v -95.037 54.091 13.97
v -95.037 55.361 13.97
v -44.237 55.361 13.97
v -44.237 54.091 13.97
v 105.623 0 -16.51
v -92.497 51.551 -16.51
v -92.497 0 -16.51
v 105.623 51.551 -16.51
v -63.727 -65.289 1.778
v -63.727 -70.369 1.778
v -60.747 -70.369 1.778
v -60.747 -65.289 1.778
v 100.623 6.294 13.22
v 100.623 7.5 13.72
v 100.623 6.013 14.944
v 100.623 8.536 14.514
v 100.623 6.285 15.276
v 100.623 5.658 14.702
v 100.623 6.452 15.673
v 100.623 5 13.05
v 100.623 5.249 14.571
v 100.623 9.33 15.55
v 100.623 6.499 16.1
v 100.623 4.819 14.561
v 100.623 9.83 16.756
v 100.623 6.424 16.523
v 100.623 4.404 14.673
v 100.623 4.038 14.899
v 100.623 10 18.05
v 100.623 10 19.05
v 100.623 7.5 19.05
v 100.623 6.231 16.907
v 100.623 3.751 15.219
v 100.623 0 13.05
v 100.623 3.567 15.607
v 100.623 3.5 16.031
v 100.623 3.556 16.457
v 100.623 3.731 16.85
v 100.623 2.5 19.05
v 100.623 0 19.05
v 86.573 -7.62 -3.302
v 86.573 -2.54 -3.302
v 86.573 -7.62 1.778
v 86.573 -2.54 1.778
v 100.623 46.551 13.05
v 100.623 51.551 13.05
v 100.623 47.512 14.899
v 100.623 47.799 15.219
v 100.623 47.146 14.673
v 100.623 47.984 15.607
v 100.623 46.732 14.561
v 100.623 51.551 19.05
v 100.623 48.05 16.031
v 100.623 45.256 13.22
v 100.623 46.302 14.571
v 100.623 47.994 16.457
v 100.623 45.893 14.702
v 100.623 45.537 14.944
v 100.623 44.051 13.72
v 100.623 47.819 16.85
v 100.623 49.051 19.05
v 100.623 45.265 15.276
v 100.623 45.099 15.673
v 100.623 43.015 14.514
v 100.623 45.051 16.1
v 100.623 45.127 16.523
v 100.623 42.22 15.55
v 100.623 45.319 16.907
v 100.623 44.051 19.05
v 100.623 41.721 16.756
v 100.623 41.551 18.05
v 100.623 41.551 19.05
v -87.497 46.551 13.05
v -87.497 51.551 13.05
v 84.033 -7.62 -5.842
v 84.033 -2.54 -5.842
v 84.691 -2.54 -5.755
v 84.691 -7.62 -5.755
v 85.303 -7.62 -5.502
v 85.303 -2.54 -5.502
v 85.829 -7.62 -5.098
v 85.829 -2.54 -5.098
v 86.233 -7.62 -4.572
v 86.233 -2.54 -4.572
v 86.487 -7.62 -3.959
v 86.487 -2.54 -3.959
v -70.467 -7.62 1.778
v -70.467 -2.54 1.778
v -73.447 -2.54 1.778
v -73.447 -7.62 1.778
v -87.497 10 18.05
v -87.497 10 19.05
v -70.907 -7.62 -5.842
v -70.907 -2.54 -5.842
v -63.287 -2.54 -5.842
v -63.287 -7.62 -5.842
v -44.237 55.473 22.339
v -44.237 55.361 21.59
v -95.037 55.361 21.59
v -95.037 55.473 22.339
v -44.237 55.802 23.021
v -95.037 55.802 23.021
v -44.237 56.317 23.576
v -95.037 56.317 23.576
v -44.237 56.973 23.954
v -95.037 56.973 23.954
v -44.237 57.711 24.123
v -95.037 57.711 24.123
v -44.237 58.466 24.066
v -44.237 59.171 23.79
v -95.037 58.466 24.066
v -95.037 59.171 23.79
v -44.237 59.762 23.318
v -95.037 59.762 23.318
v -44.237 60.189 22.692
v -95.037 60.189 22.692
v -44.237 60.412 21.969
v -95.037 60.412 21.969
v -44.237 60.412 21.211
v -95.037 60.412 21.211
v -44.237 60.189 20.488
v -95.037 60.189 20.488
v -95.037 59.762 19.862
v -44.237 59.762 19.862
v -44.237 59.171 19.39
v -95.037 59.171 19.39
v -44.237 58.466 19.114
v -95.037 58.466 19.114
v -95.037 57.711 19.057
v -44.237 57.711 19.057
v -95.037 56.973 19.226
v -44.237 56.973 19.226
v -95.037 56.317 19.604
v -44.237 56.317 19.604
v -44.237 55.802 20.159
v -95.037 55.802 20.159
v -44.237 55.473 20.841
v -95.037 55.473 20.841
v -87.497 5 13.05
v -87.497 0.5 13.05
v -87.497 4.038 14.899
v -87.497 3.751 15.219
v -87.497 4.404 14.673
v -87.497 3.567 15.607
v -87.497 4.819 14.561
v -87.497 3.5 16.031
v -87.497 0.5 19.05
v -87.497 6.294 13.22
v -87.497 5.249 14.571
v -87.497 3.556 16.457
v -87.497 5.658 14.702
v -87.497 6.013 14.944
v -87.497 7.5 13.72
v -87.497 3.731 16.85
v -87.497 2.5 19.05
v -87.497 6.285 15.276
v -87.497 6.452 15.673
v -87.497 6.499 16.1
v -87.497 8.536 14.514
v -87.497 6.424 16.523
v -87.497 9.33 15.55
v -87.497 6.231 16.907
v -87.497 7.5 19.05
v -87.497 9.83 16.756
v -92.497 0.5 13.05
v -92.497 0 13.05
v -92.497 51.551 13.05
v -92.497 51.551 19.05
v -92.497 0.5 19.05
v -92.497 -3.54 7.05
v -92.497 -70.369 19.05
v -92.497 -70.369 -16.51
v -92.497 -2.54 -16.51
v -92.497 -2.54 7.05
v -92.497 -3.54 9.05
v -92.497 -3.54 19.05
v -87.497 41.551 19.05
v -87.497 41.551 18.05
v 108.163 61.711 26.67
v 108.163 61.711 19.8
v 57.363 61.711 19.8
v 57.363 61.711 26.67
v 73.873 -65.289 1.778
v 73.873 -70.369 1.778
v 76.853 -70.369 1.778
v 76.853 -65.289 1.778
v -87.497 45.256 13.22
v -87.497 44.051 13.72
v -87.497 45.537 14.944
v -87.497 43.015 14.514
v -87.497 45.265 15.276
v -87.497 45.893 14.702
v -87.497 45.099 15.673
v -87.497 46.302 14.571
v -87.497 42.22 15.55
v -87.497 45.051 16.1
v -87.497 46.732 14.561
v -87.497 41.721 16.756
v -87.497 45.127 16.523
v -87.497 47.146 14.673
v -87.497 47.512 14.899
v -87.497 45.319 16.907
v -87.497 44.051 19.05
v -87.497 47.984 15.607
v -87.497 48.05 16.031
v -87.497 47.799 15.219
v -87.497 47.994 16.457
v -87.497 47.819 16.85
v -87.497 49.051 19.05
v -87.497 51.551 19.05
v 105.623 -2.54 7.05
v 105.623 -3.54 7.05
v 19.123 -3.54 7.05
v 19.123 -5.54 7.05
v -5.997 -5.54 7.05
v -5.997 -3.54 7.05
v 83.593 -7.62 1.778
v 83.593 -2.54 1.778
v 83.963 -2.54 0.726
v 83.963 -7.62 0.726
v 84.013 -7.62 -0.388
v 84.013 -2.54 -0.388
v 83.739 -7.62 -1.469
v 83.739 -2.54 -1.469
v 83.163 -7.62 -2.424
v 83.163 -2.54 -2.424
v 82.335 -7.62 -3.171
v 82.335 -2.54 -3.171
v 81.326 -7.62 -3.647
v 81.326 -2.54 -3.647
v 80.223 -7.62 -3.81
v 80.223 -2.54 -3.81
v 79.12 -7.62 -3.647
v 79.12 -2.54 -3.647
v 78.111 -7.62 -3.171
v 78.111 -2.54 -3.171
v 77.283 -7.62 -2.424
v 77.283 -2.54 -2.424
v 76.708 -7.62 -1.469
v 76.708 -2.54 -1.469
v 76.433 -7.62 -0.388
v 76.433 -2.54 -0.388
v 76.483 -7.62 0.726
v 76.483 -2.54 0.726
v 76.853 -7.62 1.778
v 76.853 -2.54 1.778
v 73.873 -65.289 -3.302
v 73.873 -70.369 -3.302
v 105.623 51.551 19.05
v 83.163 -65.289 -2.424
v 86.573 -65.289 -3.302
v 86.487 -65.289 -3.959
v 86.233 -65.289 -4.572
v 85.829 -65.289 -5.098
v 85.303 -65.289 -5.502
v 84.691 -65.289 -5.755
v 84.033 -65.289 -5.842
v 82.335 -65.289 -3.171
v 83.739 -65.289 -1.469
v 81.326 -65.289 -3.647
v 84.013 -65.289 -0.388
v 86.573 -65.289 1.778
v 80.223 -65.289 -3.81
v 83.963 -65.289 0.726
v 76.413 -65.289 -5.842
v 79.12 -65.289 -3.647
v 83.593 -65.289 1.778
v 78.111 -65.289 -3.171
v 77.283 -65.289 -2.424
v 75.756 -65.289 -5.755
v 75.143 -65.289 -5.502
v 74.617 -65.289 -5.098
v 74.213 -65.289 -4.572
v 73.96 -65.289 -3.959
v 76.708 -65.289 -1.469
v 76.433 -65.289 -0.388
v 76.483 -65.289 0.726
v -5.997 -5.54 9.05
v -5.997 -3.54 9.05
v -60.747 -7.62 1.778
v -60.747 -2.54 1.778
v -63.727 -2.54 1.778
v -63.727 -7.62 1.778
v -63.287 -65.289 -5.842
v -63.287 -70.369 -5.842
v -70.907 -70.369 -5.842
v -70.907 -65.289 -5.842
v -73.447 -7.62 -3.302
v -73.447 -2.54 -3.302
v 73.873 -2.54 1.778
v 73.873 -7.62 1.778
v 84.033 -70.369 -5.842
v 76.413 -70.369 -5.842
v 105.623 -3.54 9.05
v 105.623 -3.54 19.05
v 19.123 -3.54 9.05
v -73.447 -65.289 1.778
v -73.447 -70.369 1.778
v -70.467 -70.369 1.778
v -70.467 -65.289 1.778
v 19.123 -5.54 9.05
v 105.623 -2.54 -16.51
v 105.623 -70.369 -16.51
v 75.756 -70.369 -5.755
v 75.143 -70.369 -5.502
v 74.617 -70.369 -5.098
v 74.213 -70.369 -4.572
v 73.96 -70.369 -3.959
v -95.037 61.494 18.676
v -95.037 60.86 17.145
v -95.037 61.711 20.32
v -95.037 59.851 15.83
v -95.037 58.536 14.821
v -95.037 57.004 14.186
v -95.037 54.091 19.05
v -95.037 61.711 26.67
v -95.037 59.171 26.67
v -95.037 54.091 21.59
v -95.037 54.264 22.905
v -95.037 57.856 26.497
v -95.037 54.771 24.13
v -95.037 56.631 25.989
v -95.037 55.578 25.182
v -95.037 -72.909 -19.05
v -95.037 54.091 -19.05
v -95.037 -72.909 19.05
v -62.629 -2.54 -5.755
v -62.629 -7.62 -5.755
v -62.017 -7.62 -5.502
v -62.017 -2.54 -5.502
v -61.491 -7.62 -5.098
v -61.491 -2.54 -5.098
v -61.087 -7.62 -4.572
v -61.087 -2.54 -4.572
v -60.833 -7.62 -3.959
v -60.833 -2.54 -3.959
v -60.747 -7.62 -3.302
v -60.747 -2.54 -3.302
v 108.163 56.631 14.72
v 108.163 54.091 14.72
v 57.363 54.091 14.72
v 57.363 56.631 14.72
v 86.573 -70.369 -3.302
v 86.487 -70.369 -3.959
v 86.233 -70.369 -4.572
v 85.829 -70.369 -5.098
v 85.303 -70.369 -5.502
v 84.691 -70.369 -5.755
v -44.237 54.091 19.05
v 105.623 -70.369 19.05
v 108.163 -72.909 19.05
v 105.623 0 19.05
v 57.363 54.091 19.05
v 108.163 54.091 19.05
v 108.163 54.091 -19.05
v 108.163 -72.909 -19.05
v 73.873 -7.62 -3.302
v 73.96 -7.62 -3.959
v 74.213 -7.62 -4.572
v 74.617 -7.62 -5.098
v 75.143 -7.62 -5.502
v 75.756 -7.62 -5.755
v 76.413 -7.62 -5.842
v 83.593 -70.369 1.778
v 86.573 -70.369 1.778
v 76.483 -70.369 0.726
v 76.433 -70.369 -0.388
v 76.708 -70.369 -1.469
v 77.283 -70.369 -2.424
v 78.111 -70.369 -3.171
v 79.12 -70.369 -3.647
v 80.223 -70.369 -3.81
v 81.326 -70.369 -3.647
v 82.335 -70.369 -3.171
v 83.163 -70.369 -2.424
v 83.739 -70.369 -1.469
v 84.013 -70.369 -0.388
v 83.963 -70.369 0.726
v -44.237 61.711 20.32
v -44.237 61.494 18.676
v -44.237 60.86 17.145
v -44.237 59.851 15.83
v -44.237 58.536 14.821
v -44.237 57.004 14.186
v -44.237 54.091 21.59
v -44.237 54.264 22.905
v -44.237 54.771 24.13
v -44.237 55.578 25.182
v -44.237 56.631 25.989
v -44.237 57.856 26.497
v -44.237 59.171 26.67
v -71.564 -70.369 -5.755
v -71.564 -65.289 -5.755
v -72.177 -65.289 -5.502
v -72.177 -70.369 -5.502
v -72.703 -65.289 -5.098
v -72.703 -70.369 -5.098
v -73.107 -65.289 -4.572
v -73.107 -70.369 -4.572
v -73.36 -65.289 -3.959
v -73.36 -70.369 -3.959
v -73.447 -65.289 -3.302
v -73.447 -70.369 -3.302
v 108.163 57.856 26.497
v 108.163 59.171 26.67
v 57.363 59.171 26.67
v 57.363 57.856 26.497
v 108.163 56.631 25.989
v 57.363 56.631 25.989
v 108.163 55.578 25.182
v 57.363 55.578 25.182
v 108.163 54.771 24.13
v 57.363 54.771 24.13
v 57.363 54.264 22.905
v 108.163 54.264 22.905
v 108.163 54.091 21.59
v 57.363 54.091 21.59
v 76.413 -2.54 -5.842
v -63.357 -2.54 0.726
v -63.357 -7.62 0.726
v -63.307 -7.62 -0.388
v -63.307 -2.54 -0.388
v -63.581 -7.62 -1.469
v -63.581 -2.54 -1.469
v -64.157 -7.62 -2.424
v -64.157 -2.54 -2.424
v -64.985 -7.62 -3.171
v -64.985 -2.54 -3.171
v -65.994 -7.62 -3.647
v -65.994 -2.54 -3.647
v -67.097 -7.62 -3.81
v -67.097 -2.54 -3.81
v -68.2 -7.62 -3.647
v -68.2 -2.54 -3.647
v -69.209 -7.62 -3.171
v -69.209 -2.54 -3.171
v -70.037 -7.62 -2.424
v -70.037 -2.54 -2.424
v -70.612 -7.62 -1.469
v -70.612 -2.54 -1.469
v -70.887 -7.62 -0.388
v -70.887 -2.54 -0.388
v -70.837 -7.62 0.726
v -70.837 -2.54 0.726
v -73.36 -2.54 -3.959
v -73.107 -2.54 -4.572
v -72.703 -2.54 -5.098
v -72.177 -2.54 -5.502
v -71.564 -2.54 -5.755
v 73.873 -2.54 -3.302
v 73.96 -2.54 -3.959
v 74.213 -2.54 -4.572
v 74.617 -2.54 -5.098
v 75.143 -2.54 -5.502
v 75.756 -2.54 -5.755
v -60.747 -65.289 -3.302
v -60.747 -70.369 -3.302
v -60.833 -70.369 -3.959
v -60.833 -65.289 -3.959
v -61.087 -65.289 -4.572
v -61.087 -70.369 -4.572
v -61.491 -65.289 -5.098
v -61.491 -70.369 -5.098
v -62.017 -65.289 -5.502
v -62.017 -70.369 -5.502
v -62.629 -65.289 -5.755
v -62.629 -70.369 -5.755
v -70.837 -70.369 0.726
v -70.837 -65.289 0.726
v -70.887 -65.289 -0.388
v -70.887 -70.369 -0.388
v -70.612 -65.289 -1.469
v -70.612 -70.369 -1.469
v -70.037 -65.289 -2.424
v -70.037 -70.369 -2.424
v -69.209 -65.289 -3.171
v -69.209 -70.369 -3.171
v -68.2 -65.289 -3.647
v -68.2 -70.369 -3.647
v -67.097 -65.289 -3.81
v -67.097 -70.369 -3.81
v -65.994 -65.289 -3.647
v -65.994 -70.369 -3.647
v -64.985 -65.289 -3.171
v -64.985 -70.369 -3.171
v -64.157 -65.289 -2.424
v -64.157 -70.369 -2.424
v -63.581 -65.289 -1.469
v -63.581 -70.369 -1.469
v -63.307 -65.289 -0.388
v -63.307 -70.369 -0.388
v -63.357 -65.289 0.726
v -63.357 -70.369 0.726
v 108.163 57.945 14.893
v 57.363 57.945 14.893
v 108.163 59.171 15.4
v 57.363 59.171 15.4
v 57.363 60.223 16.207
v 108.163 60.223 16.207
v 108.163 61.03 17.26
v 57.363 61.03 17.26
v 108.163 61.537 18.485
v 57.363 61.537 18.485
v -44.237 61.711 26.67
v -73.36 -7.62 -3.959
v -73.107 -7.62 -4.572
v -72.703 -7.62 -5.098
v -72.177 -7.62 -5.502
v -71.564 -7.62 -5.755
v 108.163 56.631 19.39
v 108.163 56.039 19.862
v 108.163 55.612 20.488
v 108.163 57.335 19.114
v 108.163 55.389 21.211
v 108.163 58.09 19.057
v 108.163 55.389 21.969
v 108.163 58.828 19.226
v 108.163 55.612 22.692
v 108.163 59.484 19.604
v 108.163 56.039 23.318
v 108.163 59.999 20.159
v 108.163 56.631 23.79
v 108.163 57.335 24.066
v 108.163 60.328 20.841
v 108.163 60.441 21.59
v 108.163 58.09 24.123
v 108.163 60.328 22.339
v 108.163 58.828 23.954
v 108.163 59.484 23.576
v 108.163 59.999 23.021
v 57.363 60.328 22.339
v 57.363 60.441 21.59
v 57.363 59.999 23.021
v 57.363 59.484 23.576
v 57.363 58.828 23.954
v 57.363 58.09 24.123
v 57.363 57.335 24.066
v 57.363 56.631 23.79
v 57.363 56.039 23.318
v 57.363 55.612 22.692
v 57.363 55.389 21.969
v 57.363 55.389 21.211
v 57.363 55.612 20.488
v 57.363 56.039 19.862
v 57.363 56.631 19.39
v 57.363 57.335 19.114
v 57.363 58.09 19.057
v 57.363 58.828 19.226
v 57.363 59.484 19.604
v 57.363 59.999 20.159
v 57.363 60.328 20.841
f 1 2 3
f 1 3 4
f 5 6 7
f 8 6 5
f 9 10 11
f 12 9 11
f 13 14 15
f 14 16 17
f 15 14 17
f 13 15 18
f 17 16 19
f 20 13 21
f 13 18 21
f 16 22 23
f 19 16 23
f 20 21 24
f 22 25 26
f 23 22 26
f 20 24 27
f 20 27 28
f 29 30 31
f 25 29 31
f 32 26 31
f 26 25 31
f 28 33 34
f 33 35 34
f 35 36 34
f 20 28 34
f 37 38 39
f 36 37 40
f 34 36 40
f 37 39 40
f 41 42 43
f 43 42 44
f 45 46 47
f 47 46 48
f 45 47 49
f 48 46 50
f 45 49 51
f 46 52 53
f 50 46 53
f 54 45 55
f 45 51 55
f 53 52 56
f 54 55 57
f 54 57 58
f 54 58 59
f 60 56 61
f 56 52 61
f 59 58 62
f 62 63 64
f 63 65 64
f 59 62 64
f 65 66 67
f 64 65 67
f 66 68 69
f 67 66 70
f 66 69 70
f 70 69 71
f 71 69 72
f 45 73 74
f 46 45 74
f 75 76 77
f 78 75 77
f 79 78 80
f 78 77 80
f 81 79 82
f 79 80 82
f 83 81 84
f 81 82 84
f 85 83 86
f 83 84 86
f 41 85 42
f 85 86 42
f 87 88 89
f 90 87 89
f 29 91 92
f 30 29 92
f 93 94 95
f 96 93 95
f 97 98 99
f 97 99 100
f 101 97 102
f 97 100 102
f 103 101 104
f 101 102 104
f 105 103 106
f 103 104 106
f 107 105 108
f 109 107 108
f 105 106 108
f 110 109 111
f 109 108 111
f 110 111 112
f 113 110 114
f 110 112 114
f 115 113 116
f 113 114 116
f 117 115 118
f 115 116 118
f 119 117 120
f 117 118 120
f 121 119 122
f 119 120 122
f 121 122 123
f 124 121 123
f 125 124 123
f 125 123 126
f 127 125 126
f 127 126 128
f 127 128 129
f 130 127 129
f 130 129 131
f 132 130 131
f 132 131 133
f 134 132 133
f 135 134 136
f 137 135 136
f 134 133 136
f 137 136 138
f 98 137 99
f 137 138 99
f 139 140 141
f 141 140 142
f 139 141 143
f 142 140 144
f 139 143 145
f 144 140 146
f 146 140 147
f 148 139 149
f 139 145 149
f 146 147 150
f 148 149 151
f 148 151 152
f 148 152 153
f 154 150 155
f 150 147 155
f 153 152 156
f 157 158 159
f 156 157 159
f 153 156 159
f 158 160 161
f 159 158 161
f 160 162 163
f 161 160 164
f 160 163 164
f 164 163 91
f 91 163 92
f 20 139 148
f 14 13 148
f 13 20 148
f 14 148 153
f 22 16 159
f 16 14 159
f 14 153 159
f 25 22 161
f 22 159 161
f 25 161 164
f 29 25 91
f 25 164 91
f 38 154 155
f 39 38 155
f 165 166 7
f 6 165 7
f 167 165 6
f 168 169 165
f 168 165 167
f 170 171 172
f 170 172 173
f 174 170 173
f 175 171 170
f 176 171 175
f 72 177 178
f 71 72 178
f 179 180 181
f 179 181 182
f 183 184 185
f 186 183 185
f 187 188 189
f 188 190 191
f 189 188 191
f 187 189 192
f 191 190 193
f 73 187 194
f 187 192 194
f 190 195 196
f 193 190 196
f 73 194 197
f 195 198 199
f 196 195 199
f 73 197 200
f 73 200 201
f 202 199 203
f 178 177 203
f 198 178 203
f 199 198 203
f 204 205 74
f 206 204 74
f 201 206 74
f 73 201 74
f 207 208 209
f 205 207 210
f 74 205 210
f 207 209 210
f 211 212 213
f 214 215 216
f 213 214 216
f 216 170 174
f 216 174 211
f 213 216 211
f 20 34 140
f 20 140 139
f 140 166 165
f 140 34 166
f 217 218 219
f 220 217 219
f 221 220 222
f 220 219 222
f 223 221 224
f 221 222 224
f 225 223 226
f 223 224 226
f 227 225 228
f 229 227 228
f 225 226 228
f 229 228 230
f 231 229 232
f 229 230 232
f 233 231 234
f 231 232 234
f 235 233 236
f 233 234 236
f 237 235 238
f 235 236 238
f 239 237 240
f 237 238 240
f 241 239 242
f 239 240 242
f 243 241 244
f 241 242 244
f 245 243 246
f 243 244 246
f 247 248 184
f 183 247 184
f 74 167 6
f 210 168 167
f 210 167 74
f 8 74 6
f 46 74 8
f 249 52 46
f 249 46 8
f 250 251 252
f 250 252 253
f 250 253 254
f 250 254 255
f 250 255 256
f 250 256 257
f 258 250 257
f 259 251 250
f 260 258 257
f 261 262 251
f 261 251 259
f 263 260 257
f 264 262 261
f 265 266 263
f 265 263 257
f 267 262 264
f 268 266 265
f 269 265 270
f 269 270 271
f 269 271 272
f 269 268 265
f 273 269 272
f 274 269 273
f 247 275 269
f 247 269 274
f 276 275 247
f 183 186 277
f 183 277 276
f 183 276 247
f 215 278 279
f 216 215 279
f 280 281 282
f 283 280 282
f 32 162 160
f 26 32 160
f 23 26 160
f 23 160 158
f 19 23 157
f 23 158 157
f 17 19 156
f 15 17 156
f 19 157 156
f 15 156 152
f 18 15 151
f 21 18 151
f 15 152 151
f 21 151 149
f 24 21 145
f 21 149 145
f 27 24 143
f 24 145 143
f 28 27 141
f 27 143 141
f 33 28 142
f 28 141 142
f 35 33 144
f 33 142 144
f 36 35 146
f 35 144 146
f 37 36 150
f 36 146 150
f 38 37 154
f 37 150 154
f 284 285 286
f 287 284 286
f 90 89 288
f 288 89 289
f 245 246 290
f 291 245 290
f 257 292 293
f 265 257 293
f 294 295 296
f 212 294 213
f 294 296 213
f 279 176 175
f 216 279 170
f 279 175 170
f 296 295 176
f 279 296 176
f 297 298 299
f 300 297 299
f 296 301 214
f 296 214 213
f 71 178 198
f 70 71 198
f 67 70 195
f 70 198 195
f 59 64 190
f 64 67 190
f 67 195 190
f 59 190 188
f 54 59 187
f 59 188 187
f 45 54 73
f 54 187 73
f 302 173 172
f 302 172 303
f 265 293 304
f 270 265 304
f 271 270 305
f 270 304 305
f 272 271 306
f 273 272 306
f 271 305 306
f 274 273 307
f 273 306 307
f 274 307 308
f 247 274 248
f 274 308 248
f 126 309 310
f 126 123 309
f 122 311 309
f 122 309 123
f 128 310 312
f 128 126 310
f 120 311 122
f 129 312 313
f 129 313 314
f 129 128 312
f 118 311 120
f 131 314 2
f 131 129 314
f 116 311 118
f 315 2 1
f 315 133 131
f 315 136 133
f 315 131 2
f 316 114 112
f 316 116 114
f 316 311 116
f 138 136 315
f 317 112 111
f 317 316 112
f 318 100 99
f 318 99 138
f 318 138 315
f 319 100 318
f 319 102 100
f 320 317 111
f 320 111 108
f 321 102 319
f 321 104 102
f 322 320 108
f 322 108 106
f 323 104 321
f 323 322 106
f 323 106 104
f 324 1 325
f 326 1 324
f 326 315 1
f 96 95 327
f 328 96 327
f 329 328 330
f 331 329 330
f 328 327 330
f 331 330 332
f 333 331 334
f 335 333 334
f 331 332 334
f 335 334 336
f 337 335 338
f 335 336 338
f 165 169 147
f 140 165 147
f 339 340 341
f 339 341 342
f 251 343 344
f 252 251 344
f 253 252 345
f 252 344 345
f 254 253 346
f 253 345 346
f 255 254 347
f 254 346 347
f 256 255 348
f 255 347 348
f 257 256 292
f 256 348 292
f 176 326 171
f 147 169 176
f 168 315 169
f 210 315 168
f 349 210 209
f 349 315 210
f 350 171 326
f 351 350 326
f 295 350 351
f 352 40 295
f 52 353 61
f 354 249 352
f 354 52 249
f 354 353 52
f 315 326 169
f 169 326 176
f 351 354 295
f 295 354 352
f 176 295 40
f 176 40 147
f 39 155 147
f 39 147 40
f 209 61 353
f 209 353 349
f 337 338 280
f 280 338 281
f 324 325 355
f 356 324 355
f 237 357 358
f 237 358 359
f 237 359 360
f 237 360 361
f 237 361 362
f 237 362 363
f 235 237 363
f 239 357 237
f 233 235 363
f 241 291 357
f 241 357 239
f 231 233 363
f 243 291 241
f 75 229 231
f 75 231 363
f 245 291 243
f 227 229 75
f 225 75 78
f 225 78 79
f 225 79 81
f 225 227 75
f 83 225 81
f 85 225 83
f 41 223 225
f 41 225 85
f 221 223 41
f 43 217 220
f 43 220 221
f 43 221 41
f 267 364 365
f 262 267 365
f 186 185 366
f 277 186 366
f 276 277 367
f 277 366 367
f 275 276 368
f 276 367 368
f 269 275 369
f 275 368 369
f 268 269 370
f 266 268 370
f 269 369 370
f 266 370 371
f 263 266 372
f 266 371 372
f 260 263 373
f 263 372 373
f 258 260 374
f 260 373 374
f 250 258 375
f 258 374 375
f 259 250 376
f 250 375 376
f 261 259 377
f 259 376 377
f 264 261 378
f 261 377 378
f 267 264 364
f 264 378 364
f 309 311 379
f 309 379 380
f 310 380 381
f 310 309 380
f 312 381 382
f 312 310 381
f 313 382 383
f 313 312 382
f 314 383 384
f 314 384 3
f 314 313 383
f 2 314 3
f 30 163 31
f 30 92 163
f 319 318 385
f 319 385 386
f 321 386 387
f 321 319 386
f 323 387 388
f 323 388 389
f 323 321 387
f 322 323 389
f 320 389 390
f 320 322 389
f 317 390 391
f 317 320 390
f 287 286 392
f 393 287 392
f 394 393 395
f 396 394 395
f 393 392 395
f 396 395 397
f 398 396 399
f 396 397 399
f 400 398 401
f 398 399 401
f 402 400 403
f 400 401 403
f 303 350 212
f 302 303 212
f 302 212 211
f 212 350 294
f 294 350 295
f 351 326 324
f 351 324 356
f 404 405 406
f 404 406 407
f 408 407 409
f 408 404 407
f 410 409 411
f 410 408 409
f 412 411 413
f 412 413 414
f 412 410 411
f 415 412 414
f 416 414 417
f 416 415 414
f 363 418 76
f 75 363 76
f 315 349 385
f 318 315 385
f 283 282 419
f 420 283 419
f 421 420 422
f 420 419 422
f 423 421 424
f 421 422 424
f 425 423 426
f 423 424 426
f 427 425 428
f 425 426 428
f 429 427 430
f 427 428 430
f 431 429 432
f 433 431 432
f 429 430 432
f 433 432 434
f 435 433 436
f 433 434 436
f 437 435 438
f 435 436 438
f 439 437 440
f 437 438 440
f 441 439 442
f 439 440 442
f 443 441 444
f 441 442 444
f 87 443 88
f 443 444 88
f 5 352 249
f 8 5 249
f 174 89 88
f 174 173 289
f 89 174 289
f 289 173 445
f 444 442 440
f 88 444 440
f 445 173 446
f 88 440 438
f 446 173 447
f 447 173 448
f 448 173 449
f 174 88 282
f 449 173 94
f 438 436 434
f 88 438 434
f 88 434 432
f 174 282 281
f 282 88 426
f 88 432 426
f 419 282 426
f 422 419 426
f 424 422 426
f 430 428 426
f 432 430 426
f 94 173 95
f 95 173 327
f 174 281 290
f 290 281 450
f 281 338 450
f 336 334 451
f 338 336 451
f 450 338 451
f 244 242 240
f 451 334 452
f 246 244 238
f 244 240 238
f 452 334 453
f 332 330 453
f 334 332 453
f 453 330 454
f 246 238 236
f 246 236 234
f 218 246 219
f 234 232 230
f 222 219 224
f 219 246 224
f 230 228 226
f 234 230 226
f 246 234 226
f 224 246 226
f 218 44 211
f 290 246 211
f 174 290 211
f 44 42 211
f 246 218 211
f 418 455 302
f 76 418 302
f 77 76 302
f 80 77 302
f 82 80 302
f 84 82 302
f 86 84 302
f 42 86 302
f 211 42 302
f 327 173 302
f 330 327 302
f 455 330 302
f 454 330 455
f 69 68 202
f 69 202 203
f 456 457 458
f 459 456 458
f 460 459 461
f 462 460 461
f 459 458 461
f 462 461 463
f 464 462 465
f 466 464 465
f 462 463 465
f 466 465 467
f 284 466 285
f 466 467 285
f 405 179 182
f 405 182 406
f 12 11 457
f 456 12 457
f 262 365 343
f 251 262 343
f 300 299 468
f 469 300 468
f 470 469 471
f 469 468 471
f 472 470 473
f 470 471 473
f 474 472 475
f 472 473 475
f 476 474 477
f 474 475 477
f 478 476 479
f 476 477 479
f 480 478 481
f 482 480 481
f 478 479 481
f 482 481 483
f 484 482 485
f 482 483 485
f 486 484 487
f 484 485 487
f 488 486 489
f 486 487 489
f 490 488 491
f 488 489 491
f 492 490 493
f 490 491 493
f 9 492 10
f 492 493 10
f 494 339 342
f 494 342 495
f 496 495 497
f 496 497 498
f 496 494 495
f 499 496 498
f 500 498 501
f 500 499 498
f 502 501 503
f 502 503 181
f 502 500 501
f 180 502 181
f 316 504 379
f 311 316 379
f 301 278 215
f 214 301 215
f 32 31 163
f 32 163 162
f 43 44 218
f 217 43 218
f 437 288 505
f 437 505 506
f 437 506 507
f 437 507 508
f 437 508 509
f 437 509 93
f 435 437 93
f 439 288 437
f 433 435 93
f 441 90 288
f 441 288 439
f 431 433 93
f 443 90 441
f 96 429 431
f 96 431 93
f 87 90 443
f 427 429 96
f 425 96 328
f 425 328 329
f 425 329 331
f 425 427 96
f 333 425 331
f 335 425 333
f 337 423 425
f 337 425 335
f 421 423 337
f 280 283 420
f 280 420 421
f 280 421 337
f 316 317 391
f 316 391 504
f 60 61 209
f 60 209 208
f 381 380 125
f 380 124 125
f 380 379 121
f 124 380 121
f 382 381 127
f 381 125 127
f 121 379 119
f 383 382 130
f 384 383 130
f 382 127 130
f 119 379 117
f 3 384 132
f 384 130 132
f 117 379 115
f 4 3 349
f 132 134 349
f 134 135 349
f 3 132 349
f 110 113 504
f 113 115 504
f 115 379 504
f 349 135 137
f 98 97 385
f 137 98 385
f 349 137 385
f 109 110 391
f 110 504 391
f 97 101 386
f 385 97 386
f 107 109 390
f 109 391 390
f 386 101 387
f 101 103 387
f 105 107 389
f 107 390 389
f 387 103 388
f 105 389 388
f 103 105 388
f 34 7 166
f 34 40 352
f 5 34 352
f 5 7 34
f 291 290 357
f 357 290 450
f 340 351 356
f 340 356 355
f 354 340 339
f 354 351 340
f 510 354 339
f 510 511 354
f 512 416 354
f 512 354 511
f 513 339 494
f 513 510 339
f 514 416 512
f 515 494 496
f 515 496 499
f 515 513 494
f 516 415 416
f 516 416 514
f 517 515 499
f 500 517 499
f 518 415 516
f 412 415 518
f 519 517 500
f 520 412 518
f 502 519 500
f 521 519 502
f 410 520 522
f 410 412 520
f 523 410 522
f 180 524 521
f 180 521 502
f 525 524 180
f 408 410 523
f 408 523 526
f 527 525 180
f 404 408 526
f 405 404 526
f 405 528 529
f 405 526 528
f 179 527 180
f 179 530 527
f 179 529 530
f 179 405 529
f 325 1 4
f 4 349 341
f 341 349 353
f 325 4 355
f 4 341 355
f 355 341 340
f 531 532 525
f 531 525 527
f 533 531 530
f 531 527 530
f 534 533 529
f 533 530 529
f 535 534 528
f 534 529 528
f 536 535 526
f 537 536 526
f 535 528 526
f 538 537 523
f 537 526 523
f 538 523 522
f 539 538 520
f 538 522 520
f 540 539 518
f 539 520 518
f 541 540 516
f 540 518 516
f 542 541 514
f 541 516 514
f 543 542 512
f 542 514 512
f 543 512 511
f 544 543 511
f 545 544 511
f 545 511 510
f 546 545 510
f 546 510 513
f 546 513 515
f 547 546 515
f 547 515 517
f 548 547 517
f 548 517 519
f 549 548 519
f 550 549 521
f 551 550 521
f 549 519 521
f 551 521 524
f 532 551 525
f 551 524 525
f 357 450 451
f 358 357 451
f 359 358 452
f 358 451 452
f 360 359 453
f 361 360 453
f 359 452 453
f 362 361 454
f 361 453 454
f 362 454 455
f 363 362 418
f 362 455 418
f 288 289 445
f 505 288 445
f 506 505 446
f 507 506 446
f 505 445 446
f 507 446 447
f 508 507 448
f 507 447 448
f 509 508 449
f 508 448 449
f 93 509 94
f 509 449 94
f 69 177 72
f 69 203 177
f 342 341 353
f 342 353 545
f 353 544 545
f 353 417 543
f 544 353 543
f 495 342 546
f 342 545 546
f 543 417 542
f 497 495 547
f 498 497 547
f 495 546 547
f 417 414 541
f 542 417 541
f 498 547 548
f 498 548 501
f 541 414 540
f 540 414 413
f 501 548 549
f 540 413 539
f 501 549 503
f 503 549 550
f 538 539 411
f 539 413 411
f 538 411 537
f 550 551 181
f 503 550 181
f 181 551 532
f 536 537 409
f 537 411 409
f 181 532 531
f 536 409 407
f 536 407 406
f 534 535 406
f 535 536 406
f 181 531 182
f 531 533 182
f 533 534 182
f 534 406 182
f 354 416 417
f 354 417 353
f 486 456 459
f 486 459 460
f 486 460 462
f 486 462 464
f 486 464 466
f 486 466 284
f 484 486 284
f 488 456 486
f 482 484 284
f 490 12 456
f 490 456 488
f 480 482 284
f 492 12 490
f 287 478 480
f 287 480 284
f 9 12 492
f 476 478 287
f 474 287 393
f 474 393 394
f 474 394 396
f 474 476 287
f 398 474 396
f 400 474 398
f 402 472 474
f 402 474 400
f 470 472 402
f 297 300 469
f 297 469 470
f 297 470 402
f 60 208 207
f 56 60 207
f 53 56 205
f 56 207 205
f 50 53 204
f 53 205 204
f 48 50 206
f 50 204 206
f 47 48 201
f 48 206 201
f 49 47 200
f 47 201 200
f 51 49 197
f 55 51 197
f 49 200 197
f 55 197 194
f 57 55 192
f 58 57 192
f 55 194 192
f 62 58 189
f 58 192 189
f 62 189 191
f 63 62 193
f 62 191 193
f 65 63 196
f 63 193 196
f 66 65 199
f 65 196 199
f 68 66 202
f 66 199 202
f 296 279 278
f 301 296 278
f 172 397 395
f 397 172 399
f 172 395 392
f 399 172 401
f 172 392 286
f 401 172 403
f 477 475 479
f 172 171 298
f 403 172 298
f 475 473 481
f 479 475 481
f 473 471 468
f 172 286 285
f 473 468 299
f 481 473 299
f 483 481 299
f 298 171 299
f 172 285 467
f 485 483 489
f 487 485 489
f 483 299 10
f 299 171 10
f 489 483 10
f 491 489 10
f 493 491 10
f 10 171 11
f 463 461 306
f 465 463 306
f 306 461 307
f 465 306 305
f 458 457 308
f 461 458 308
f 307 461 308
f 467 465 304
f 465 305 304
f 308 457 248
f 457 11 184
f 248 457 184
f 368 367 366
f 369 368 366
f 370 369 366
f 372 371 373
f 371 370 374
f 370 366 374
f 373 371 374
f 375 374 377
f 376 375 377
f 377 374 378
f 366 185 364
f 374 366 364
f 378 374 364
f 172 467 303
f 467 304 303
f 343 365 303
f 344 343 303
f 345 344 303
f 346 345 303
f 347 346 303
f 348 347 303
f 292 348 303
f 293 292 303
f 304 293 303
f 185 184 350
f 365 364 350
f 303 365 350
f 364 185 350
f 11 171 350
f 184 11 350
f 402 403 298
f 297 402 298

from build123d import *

# Parameters (mm, degrees)
F0_W      = 203.2
F0_H      = 127
F1_DEPTH  = 19.05
F2_T      = -2.54
F3_W      = 198.12
F3_H      = 2.54
F4_DEPTH  = 35.56
F6_DEPTH  = 5.08
F8_DEPTH  = 5.08
F9_R      = 2.54
F10_DEPTH = 50.8
F11_R     = 2.54
F12_DEPTH = 50.8
F14_DEPTH = 198.12
F15_W     = 5
F15_H     = 51.0505303715
F16_DEPTH = 10
F15_H_2   = 2.5
F15_H_3   = 5
F17_DEPTH = 25
F18_W     = 5
F18_H     = 2.5
F18_H_2   = 5
F19_DEPTH = 15
F21_DEPTH = 198.12
F22_W     = 86.5
F22_H     = 3.7755742139
F22_H_2   = 3.4886886767
F23_DEPTH = 15


with BuildPart() as f1:
    # F0 (on Top) → F1 (new body, symmetric)
    with BuildSketch(Plane.XY):
        with Locations((6.5631009638, -9.4094696285)):
            Rectangle(F0_W, F0_H)
    extrude(amount=F1_DEPTH, both=True)

    # F2
    f2_openings = [f1.faces().sort_by_distance(p)[0] for p in [
        (6.563101, -9.40947, 19.05),
    ]]
    offset(amount=F2_T, openings=f2_openings)

    # F3 (on face) → F4 (join, through all)
    with BuildSketch(Plane.XY.offset(-16.51)):
        with Locations((6.5631009638, -1.27)):
            Rectangle(F3_W, F3_H)
    extrude(amount=F4_DEPTH)

    # F5 (on face) → F6 (join)
    with BuildSketch(Plane.XZ.offset(2.54)):
        with BuildLine():
            ThreePointArc((-63.2868990362, -5.842), (-61.490847812, -5.0980512242), (-60.7468990362, -3.302))
            Line((-60.7468990362, -3.302), (-60.7468990362, 1.778))
            Line((-60.7468990362, 1.778), (-63.7272082492, 1.778))
            ThreePointArc((-63.7272082492, 1.778), (-67.0968990362, -3.81), (-70.4665898232, 1.778))
            Line((-70.4665898232, 1.778), (-73.4468990362, 1.778))
            Line((-73.4468990362, 1.778), (-73.4468990362, -3.302))
            ThreePointArc((-73.4468990362, -3.302), (-72.7029502604, -5.0980512242), (-70.9068990362, -5.842))
            Line((-70.9068990362, -5.842), (-63.2868990362, -5.842))
        make_face()
        with BuildLine():
            ThreePointArc((83.5927917508, 1.778), (80.2231009638, -3.81), (76.8534101768, 1.778))
            Line((76.8534101768, 1.778), (73.8731009638, 1.778))
            Line((73.8731009638, 1.778), (73.8731009638, -3.302))
            ThreePointArc((73.8731009638, -3.302), (74.6170497396, -5.0980512242), (76.4131009638, -5.842))
            Line((76.4131009638, -5.842), (84.0331009638, -5.842))
            ThreePointArc((84.0331009638, -5.842), (85.829152188, -5.0980512242), (86.5731009638, -3.302))
            Line((86.5731009638, -3.302), (86.5731009638, 1.778))
            Line((86.5731009638, 1.778), (83.5927917508, 1.778))
        make_face()
    extrude(amount=F6_DEPTH)

    # F7 (on face) → F8 (join)
    with BuildSketch(Plane(origin=(0, -70.3694696285, 0), x_dir=(-1, 0, 0), z_dir=(0, 1, 0))):
        with BuildLine():
            ThreePointArc((-76.8534101768, 1.778), (-80.2231009638, -3.81), (-83.5927917508, 1.778))
            Line((-83.5927917508, 1.778), (-86.5731009638, 1.778))
            Line((-86.5731009638, 1.778), (-86.5731009638, -3.302))
            ThreePointArc((-86.5731009638, -3.302), (-85.829152188, -5.0980512242), (-84.0331009638, -5.842))
            Line((-84.0331009638, -5.842), (-76.4131009638, -5.842))
            ThreePointArc((-76.4131009638, -5.842), (-74.6170497396, -5.0980512242), (-73.8731009638, -3.302))
            Line((-73.8731009638, -3.302), (-73.8731009638, 1.778))
            Line((-73.8731009638, 1.778), (-76.8534101768, 1.778))
        make_face()
        with BuildLine():
            ThreePointArc((60.7468990362, -3.302), (61.490847812, -5.0980512242), (63.2868990362, -5.842))
            Line((63.2868990362, -5.842), (70.9068990362, -5.842))
            ThreePointArc((70.9068990362, -5.842), (72.7029502604, -5.0980512242), (73.4468990362, -3.302))
            Line((73.4468990362, -3.302), (73.4468990362, 1.778))
            Line((73.4468990362, 1.778), (70.4665898232, 1.778))
            ThreePointArc((70.4665898232, 1.778), (67.0968990362, -3.81), (63.7272082492, 1.778))
            Line((63.7272082492, 1.778), (60.7468990362, 1.778))
            Line((60.7468990362, 1.778), (60.7468990362, -3.302))
        make_face()
    extrude(amount=F8_DEPTH)

    # F9 (on face) → F10 (join)
    with BuildSketch(Plane.YZ.offset(108.1631009638)):
        with BuildLine():
            Line((54.0905303715, 21.59), (54.0905303715, 14.7195085883))
            Line((54.0905303715, 14.7195085883), (56.6305303715, 14.7195085883))
            ThreePointArc((56.6305303715, 14.7195085883), (60.22263282, 16.2074061399), (61.7105303715, 19.7995085883))
            Line((61.7105303715, 19.7995085883), (61.7105303715, 26.67))
            Line((61.7105303715, 26.67), (59.1705303715, 26.67))
            ThreePointArc((59.1705303715, 26.67), (55.5784279231, 25.1821024484), (54.0905303715, 21.59))
        make_face()
        with Locations((57.9005303715, 21.59)):
            Circle(F9_R, mode=Mode.SUBTRACT)
    extrude(amount=-F10_DEPTH)

    # F11 (on face) → F12 (join)
    with BuildSketch(Plane(origin=(-95.0368990362, 0, 0), x_dir=(0, -1, 0), z_dir=(-1, 0, 0))):
        with BuildLine():
            Line((-55.3605303715, 13.97), (-54.0905303715, 13.97))
            Line((-54.0905303715, 13.97), (-54.0905303715, 19.05))
            Line((-54.0905303715, 19.05), (-54.0905303715, 21.59))
            ThreePointArc((-54.0905303715, 21.59), (-55.5784279231, 25.1821024484), (-59.1705303715, 26.67))
            Line((-59.1705303715, 26.67), (-61.7105303715, 26.67))
            Line((-61.7105303715, 26.67), (-61.7105303715, 20.32))
            ThreePointArc((-61.7105303715, 20.32), (-59.8506584321, 15.8298719395), (-55.3605303715, 13.97))
        make_face()
        with Locations((-57.9005303715, 21.59)):
            Circle(F11_R, mode=Mode.SUBTRACT)
    extrude(amount=-F12_DEPTH)

    # F13 (on face) → F14 (join, through all)
    with BuildSketch(Plane.YZ.offset(-92.4968990362)):
        with BuildLine():
            Line((46.5505303715, 13.05), (51.5505303715, 13.05))
            Line((51.5505303715, 13.05), (51.5505303715, 19.05))
            Line((51.5505303715, 19.05), (49.0505303715, 19.05))
            Line((49.0505303715, 19.05), (47.8193881256, 16.85))
            ThreePointArc((47.8193881256, 16.85), (46.5163953065, 14.5503884512), (45.3193881256, 16.906906512))
            Line((45.3193881256, 16.906906512), (44.0505303715, 19.05))
            Line((44.0505303715, 19.05), (41.5505303715, 19.05))
            Line((41.5505303715, 19.05), (41.5505303715, 18.05))
            ThreePointArc((41.5505303715, 18.05), (43.0149964656, 14.5144660941), (46.5505303715, 13.05))
        make_face()
        with BuildLine():
            Line((0, 19.05), (0, 13.05))
            Line((0, 13.05), (5, 13.05))
            ThreePointArc((5, 13.05), (8.5355339059, 14.5144660941), (10, 18.05))
            Line((10, 18.05), (10, 19.05))
            Line((10, 19.05), (7.5, 19.05))
            Line((7.5, 19.05), (6.231142246, 16.906906512))
            ThreePointArc((6.231142246, 16.906906512), (5.034135065, 14.5503884512), (3.731142246, 16.85))
            Line((3.731142246, 16.85), (2.5, 19.05))
            Line((2.5, 19.05), (0, 19.05))
        make_face()
    extrude(amount=F14_DEPTH)

    # F15 (on face) → F16 (cut)
    with BuildSketch(Plane.XY.offset(19.05)):
        with Locations((-89.9968990362, 26.0252651858)):
            Rectangle(F15_W, F15_H)
    extrude(amount=-F16_DEPTH, mode=Mode.SUBTRACT)

    # F15 (on face) → F17 (cut)
    with BuildSketch(Plane.XY.offset(19.05)):
        with Locations((-89.9968990362, 50.3005303715)):
            Rectangle(F15_W, F15_H_2)
        with Locations((-89.9968990362, 46.5505303715)):
            Rectangle(F15_W, F15_H_3)
        with Locations((-89.9968990362, 42.8005303715)):
            Rectangle(F15_W, F15_H_2)
    extrude(amount=-F17_DEPTH, mode=Mode.SUBTRACT)

    # F18 (on face) → F19 (cut)
    with BuildSketch(Plane.XY.offset(19.05)):
        with Locations((103.1231009638, 50.3005303715)):
            Rectangle(F18_W, F18_H)
        with Locations((103.1231009638, 46.5505303715)):
            Rectangle(F18_W, F18_H_2)
        with Locations((103.1231009638, 42.8005303715)):
            Rectangle(F18_W, F18_H)
        with Locations((103.1231009638, 8.75)):
            Rectangle(F18_W, F18_H)
        with Locations((103.1231009638, 5)):
            Rectangle(F18_W, F18_H_2)
        with Locations((103.1231009638, 1.25)):
            Rectangle(F18_W, F18_H)
    extrude(amount=-F19_DEPTH, mode=Mode.SUBTRACT)

    # F20 (on face) → F21 (join, through all)
    with BuildSketch(Plane.YZ.offset(-92.4968990362)):
        Polygon((-5.54, 7.05), (-2.54, 7.05), (-2.54, 19.05), (-3.54, 19.05), (-3.54, 9.05), (-5.54, 9.05), align=None)
    extrude(amount=F21_DEPTH)

    # F22 (on face) → F23 (cut)
    with BuildSketch(Plane.XY.offset(19.05)):
        with Locations((-49.2468990362, -5.4277871069)):
            Rectangle(F22_W, F22_H)
        with Locations((62.3731009638, -5.2843443383)):
            Rectangle(F22_W, F22_H_2)
    extrude(amount=-F23_DEPTH, mode=Mode.SUBTRACT)


solid = f1.part
